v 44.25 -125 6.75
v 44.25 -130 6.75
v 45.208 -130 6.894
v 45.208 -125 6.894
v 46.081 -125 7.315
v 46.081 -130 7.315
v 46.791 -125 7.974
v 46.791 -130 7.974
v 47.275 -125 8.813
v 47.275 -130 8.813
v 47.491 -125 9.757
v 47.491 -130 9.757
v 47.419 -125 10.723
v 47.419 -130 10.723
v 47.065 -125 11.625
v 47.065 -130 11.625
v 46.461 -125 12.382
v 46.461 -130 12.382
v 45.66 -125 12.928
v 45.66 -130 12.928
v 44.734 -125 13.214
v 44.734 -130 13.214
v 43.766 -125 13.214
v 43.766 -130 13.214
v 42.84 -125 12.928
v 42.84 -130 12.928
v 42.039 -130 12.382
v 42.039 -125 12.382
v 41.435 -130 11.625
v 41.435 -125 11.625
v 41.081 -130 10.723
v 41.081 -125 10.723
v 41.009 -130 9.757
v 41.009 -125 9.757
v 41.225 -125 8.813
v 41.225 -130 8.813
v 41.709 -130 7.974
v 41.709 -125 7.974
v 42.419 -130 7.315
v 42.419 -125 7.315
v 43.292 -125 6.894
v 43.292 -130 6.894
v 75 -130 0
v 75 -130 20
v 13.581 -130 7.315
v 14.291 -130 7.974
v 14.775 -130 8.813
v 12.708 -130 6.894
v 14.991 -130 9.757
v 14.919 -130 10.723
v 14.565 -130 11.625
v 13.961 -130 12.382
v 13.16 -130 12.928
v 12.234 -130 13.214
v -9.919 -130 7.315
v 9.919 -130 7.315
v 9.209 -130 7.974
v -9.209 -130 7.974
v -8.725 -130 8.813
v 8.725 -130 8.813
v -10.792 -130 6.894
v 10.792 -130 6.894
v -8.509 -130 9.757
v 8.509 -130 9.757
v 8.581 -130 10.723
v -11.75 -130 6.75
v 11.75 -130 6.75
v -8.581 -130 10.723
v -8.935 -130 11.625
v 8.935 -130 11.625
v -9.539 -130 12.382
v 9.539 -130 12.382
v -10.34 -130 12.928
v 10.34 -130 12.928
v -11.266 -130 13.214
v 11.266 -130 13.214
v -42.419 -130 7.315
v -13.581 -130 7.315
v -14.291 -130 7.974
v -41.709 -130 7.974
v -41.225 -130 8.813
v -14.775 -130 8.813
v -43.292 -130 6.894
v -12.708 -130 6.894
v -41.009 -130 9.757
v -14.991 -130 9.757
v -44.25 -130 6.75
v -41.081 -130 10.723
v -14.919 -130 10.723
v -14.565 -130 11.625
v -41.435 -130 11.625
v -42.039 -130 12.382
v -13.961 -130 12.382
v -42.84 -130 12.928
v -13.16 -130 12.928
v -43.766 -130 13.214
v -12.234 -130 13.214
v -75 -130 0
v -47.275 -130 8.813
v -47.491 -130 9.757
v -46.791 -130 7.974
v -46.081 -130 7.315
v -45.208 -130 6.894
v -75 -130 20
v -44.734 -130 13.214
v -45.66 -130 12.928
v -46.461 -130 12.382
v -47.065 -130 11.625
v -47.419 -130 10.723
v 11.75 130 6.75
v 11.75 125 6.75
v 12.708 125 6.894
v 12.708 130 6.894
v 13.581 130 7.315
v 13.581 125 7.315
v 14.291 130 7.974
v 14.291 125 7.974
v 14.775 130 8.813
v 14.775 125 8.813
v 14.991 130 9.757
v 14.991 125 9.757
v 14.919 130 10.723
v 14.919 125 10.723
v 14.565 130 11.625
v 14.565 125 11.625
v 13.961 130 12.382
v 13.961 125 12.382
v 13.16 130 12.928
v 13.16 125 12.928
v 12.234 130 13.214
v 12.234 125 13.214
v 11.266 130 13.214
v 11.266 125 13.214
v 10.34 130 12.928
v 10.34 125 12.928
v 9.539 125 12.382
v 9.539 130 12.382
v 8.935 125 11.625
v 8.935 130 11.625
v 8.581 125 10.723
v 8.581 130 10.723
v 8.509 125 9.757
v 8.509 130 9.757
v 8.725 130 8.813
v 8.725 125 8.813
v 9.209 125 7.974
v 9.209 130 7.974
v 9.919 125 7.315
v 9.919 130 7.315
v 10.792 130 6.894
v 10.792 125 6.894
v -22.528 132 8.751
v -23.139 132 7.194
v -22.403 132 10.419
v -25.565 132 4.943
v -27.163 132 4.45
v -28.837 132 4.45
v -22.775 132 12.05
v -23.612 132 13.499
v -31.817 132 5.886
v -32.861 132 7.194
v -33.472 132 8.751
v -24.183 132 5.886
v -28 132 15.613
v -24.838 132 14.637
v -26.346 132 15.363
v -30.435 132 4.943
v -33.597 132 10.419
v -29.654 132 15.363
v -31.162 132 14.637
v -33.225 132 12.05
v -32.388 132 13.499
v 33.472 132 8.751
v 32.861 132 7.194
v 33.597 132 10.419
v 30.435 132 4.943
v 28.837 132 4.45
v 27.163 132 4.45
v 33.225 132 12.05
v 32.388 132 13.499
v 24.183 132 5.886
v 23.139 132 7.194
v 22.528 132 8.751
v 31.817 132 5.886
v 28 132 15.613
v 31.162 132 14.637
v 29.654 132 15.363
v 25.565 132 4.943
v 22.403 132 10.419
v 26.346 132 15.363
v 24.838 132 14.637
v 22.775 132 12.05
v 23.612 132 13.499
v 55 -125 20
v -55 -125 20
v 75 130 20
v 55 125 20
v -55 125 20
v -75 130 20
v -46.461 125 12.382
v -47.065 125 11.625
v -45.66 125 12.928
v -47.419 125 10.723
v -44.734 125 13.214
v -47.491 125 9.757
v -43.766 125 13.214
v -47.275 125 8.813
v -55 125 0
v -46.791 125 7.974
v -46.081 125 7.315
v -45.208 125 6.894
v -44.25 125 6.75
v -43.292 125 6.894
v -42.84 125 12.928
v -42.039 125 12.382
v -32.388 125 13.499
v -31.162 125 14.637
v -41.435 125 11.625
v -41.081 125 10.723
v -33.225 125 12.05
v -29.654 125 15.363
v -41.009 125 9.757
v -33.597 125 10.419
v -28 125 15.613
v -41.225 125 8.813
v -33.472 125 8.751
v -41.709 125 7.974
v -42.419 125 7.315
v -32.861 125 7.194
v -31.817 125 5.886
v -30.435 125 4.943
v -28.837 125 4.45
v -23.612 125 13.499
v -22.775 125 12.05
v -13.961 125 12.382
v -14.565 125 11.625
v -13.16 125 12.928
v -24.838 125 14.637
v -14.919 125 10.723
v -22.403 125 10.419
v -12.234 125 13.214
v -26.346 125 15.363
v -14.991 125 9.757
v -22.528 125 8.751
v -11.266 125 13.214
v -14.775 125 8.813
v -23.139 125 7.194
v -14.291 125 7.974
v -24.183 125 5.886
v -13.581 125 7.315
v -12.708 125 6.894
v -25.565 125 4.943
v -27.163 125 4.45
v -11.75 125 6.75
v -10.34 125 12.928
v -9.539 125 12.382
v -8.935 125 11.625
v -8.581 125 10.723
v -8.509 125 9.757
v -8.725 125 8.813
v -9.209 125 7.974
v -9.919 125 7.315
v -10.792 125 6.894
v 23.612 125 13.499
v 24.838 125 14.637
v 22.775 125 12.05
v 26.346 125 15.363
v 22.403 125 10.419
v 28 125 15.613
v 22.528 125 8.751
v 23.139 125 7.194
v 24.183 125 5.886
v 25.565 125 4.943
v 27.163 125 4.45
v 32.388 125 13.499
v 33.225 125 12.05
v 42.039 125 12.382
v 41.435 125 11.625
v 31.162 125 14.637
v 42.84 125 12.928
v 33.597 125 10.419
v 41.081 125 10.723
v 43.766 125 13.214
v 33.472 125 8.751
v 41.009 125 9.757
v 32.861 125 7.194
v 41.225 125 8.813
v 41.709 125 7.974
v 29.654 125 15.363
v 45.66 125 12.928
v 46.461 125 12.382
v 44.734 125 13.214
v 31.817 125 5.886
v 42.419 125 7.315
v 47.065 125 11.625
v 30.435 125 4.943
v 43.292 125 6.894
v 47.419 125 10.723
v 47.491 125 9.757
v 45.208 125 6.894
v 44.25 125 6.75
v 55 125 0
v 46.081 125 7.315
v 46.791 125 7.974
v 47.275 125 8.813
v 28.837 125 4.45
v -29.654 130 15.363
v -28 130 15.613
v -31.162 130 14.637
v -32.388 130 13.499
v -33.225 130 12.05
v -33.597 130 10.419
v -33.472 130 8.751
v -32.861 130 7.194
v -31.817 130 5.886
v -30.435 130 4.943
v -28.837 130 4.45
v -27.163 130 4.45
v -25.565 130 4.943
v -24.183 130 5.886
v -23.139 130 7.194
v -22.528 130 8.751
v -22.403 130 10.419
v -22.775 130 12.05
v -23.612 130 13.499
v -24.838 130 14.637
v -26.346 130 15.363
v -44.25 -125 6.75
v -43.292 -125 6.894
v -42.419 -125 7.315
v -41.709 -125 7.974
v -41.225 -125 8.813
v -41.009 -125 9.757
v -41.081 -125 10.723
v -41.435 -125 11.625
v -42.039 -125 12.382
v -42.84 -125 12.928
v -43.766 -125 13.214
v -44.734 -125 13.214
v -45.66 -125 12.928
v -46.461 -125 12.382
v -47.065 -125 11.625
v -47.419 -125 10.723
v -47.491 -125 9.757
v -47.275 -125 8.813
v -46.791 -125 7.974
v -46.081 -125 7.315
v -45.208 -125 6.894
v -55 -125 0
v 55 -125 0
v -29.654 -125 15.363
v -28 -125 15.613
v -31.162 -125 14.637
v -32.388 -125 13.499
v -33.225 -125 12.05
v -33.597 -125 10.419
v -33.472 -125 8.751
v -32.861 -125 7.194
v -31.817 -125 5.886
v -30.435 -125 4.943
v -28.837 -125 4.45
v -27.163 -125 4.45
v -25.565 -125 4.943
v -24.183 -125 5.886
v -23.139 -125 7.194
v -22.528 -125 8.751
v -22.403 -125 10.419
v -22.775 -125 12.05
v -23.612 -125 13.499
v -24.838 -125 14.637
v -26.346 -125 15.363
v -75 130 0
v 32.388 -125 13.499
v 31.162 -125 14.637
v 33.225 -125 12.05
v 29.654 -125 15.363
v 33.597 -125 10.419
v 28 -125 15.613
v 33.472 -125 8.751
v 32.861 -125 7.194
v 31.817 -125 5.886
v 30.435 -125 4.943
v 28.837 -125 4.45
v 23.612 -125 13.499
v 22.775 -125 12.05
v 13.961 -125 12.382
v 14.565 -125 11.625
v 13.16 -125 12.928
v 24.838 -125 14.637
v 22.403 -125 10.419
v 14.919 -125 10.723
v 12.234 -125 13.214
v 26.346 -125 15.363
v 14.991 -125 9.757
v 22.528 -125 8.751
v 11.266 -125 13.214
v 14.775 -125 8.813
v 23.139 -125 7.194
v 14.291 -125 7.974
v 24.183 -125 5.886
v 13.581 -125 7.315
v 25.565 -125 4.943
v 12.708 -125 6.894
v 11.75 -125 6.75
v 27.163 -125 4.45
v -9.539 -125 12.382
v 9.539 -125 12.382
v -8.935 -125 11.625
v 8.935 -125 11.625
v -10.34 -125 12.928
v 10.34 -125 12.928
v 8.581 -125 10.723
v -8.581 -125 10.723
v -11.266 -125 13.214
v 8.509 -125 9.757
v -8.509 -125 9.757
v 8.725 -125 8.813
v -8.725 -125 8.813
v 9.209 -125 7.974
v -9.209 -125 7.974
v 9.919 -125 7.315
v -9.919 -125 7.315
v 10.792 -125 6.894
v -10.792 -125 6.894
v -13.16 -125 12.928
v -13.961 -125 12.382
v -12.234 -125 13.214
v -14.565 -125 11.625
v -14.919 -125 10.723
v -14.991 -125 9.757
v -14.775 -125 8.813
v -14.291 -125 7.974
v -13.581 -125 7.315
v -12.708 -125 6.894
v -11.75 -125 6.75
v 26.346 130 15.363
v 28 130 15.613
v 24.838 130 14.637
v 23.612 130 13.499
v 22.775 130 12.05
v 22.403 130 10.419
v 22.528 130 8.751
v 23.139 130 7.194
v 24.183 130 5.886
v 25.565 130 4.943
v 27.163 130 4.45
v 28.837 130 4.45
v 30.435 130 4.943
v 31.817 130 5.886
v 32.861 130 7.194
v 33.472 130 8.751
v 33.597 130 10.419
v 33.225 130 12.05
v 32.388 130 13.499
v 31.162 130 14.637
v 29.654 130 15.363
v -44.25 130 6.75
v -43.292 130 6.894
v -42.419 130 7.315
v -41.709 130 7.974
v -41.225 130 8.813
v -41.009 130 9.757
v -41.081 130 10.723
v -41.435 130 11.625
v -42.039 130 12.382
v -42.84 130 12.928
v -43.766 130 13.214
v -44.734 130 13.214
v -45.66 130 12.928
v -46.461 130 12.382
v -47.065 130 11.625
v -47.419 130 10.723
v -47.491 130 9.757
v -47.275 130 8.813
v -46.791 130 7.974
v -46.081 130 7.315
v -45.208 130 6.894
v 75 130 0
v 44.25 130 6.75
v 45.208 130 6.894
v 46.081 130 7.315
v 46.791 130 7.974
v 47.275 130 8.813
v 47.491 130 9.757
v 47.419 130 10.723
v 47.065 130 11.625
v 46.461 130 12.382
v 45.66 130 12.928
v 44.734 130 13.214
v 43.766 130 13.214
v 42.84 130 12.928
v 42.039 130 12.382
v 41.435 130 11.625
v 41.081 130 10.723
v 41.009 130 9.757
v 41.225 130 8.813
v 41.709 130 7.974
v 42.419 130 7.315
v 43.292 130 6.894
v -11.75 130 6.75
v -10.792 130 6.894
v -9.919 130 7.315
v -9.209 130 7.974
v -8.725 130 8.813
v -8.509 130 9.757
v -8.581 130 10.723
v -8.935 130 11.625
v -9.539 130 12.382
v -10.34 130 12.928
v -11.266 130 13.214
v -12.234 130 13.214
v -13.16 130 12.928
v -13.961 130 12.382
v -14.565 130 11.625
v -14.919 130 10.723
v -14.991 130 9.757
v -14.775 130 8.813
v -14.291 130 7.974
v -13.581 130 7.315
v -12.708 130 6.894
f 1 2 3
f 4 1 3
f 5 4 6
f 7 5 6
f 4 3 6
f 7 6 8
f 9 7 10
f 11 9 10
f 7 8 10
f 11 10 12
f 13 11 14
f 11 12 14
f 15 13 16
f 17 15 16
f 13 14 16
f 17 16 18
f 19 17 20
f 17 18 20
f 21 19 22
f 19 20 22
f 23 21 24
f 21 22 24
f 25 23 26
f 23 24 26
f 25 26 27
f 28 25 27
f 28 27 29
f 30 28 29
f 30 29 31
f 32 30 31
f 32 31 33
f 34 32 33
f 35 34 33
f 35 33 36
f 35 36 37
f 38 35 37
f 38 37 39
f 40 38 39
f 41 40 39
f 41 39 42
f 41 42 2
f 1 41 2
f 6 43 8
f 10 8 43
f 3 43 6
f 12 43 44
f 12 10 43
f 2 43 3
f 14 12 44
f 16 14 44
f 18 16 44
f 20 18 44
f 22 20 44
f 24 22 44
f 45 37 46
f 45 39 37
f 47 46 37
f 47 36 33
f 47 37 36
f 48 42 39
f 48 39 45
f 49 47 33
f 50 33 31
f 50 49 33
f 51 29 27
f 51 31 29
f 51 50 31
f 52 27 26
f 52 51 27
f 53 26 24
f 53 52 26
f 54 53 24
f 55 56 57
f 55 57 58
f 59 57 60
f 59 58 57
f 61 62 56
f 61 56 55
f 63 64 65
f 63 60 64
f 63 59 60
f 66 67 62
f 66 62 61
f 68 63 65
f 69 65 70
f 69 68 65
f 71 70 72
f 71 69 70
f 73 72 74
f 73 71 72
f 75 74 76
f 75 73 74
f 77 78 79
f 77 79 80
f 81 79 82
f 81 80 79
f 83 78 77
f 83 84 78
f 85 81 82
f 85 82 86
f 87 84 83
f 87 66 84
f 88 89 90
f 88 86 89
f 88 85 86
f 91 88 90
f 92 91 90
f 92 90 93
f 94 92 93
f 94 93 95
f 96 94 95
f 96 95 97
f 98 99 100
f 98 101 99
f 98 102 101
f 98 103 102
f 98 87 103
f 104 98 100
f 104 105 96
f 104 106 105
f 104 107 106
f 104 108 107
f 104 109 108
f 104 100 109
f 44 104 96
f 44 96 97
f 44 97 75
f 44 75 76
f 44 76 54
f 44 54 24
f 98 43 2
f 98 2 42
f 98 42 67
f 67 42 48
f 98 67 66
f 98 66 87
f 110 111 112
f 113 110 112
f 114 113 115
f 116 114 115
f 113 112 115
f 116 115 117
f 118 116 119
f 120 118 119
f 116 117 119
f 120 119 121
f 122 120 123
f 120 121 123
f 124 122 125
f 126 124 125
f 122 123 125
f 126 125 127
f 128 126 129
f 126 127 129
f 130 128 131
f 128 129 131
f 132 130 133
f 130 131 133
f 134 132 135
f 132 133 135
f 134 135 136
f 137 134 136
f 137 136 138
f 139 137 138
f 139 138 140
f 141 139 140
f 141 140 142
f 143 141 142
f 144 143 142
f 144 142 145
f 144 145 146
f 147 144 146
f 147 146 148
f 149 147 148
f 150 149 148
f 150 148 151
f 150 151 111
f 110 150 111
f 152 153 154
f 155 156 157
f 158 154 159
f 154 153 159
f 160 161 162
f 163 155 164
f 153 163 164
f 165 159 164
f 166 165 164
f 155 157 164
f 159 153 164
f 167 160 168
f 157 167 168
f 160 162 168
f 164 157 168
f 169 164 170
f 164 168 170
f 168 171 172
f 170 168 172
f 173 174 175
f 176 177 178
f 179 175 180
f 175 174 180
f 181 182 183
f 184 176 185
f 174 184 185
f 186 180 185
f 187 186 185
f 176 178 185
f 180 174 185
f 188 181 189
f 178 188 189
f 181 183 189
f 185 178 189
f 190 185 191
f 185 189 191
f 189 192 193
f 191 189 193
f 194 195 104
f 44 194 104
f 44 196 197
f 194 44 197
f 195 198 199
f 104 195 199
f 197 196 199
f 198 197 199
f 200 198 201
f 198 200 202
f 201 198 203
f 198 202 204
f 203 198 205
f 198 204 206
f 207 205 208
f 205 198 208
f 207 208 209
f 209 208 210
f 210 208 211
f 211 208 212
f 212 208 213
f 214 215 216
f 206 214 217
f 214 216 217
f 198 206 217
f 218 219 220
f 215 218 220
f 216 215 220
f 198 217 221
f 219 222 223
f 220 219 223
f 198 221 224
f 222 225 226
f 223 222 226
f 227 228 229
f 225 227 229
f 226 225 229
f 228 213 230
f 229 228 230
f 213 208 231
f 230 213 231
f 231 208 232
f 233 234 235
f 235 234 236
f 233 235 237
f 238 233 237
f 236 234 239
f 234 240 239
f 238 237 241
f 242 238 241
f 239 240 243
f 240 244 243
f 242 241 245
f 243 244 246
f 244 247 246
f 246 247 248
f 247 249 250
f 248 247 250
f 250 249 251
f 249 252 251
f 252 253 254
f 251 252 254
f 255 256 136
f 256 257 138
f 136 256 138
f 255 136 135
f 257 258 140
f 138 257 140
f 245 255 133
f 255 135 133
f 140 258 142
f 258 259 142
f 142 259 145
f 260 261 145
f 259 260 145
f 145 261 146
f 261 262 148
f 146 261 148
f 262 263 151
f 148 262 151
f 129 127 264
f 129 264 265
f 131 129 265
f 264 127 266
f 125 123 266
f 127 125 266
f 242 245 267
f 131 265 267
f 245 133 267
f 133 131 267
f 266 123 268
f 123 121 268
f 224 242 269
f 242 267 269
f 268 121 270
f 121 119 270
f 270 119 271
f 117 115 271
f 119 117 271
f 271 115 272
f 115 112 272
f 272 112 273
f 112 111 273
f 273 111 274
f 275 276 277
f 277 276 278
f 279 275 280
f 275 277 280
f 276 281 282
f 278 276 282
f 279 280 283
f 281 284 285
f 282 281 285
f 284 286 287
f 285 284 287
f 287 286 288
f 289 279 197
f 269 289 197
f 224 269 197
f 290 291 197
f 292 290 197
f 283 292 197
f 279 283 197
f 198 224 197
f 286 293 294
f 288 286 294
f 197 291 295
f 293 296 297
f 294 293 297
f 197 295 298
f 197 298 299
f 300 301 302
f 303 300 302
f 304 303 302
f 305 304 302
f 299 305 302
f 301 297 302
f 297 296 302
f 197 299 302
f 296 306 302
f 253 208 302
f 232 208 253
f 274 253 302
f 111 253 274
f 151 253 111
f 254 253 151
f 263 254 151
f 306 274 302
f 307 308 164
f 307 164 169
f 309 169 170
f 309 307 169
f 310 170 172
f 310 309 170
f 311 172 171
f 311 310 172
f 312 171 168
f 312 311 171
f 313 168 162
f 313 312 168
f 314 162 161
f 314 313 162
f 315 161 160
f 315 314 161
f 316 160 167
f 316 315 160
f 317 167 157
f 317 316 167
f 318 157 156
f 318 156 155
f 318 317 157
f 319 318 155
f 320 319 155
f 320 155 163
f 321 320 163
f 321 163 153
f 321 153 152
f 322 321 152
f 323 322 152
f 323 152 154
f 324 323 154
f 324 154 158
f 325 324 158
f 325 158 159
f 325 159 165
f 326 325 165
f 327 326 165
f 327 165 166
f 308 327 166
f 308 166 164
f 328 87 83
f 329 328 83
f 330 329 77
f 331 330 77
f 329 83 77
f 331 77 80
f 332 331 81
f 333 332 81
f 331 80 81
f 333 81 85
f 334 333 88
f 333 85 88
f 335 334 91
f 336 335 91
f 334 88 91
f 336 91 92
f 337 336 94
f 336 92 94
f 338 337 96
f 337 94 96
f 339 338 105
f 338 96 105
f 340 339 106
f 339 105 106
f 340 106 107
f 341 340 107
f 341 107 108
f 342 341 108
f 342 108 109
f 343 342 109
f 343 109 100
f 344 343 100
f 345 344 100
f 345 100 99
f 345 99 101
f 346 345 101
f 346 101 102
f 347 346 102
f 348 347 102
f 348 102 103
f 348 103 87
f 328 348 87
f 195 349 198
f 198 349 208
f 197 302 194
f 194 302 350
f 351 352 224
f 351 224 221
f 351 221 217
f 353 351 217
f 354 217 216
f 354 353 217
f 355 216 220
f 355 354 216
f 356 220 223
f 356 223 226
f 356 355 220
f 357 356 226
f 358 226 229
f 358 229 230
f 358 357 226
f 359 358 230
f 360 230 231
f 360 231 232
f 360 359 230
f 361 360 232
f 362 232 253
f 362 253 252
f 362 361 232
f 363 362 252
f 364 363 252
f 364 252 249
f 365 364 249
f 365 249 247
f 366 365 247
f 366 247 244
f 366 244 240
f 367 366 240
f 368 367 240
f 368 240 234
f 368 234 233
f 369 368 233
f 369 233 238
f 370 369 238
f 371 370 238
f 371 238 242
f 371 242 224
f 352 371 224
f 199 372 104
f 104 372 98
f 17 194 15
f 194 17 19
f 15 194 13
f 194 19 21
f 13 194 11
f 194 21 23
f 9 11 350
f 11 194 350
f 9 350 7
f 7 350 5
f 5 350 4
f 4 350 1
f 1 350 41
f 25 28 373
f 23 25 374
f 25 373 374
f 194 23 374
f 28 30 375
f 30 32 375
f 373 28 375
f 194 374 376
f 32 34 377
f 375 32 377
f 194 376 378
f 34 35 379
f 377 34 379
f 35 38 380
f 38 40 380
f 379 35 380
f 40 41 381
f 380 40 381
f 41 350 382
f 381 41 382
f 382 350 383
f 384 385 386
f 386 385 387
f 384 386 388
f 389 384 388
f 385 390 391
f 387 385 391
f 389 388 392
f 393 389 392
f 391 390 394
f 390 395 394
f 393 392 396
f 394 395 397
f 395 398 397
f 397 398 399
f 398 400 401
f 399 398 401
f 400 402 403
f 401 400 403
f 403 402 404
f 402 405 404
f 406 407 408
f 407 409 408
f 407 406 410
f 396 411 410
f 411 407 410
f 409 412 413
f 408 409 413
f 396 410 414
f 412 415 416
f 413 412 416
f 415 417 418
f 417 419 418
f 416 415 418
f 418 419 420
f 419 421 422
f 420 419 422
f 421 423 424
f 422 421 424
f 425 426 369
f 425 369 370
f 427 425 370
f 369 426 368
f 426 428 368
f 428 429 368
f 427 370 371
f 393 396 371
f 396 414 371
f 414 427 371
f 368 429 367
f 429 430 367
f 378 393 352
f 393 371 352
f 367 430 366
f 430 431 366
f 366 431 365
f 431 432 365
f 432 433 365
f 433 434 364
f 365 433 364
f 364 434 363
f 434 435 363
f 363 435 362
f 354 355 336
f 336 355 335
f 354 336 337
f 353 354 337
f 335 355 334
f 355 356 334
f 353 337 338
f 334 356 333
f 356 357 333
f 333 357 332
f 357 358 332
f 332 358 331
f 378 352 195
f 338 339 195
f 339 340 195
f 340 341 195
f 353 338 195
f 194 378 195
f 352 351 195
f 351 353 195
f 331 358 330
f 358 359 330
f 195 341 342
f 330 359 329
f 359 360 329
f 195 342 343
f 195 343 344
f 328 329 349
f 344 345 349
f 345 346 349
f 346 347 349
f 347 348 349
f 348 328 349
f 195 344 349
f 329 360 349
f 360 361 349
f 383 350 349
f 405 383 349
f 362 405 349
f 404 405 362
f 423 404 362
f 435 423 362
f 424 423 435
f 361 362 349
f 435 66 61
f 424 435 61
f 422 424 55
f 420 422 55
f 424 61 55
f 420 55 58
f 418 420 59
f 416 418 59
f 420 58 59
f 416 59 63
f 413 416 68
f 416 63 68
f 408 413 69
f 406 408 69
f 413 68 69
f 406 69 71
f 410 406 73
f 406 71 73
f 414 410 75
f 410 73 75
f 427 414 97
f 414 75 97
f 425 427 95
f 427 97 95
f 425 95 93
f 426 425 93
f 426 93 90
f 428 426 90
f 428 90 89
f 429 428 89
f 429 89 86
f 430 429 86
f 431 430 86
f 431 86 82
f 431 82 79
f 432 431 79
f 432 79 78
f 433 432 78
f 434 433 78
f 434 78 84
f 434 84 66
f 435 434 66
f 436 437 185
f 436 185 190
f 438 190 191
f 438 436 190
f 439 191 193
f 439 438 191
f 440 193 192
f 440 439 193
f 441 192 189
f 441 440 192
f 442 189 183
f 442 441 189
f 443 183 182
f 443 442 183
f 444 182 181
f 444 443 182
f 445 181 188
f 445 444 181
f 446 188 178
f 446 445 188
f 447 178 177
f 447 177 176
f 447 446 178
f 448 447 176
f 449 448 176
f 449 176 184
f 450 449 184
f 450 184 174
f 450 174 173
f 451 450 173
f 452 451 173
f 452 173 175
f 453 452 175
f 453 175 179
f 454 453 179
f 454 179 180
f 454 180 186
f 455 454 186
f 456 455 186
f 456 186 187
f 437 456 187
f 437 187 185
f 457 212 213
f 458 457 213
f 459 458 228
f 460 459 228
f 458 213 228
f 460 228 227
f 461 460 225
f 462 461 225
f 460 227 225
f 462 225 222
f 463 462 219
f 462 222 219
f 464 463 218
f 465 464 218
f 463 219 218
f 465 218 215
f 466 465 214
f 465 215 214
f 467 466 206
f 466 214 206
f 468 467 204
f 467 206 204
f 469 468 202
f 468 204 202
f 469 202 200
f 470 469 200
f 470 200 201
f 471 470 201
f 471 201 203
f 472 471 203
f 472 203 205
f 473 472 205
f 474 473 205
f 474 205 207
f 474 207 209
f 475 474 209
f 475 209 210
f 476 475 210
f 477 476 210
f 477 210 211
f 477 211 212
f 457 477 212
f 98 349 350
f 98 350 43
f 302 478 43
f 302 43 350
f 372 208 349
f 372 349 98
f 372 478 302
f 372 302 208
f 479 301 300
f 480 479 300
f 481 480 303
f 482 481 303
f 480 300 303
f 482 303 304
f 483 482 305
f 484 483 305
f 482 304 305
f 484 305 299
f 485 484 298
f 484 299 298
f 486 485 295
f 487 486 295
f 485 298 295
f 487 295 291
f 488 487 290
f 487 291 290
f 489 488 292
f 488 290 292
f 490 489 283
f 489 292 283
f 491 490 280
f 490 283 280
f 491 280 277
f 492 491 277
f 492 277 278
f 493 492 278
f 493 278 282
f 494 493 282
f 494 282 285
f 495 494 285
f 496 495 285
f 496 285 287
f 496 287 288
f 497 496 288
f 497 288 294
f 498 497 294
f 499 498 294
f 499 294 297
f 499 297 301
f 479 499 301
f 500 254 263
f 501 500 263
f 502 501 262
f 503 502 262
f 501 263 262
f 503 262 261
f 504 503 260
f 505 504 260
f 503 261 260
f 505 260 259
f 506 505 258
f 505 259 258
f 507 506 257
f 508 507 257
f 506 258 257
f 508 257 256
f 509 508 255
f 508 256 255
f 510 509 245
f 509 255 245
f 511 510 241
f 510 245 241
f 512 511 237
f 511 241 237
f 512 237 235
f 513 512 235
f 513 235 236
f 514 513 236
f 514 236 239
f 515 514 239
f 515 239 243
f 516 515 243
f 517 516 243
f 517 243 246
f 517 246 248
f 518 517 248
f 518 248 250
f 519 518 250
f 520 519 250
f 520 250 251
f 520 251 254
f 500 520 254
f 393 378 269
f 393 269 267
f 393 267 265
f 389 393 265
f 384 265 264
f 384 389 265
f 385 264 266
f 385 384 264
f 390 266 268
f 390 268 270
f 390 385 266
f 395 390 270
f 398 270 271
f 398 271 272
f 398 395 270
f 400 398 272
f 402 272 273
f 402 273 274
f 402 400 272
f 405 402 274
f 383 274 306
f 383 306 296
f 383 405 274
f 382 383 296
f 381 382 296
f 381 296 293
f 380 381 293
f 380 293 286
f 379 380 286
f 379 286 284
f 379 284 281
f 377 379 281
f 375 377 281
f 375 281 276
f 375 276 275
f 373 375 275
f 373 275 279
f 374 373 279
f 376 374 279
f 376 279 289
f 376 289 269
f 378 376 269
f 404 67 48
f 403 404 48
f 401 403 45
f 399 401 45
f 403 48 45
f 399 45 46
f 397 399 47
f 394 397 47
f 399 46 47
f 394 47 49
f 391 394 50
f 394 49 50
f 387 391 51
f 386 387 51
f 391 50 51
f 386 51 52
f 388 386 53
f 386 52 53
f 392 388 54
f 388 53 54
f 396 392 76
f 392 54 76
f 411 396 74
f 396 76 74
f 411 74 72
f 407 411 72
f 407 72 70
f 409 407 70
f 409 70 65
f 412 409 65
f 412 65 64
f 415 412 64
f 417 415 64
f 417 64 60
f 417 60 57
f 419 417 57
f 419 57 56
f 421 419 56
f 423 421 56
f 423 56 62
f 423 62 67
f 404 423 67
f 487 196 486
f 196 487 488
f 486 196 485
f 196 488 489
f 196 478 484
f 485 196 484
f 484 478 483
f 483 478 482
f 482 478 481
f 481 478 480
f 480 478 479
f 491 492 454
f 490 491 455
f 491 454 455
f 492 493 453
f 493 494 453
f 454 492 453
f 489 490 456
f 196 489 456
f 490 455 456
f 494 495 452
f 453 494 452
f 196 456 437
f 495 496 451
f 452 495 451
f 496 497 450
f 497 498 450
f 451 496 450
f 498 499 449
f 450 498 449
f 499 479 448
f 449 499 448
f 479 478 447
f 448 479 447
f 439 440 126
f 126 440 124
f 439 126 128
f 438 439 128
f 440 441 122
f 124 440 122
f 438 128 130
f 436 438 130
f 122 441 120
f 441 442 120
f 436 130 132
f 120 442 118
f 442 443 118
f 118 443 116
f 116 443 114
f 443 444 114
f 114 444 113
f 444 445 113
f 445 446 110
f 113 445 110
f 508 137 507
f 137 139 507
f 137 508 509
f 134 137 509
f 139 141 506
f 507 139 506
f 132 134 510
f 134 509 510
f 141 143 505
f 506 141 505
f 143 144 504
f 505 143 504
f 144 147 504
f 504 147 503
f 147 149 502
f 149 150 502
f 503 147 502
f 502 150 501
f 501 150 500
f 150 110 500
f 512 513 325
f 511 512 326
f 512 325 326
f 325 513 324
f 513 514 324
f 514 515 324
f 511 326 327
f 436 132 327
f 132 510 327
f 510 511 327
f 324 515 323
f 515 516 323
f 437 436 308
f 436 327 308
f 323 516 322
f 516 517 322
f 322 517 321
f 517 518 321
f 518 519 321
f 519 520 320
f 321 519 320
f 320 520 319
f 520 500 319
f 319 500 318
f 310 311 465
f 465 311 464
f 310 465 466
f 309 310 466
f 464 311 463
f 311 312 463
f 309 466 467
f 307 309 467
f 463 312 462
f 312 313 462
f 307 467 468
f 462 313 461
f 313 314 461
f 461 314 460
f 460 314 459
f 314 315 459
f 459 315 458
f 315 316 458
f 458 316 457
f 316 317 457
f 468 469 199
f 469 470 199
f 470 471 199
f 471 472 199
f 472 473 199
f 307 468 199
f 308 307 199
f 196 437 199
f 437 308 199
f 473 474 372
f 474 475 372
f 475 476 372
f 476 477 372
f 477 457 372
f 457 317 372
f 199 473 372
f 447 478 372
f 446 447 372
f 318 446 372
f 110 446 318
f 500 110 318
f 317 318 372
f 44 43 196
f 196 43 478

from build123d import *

# Parameters (mm, degrees)
BOSS_EXTRUDE1_DEPTH = 20
SKETCH2_R           = 5.612511992
BOSS_EXTRUDE2_DEPTH = 262
SKETCH3_R           = 3.25
CUT_EXTRUDE1_DEPTH  = 10
SKETCH4_R           = 3.25
CUT_EXTRUDE2_DEPTH  = 10


with BuildPart() as part:
    # Sketch1 → Boss-Extrude1 (new body)
    with BuildSketch(Plane.XY):
        Polygon((-75, -125), (-75, 125), (-75, 130), (-63.356925632, 130), (75, 130), (75, 125), (75, -125), (75, -130), (-75, -130), align=None)
        Polygon((-55, -105), (-55, 105), (-55, 125), (55, 125), (55, 105), (55, -105), (55, -125), (-55, -125), align=None, mode=Mode.SUBTRACT)
    extrude(amount=BOSS_EXTRUDE1_DEPTH)

    # Sketch2 → Boss-Extrude2 (add)
    with BuildSketch(Plane.XZ.offset(130)):
        with Locations(Location((-28, 10, 0), (0, 0, 90))):
            Circle(SKETCH2_R)
        with Locations(Location((28, 10, 0), (0, 0, 90))):
            Circle(SKETCH2_R)
    extrude(amount=-BOSS_EXTRUDE2_DEPTH)

    # Sketch3 → Cut-Extrude1 (cut)
    with BuildSketch(Plane.XZ.offset(-125)):
        with Locations(Location((-44.25, 10, 0), (0, 0, 270))):
            Circle(SKETCH3_R)
        with Locations(Location((-11.75, 10, 0), (0, 0, 270))):
            Circle(SKETCH3_R)
        with Locations(Location((11.75, 10, 0), (0, 0, 270))):
            Circle(SKETCH3_R)
        with Locations(Location((44.25, 10, 0), (0, 0, 270))):
            Circle(SKETCH3_R)
    extrude(amount=-CUT_EXTRUDE1_DEPTH, mode=Mode.SUBTRACT)

    # Sketch4 → Cut-Extrude2 (cut)
    with BuildSketch(Plane.XZ.offset(130)):
        with Locations(Location((-44.25, 10, 0), (0, 0, 270))):
            Circle(SKETCH4_R)
        with Locations(Location((-11.75, 10, 0), (0, 0, 270))):
            Circle(SKETCH4_R)
        with Locations(Location((11.75, 10, 0), (0, 0, 270))):
            Circle(SKETCH4_R)
        with Locations(Location((44.25, 10, 0), (0, 0, 270))):
            Circle(SKETCH4_R)
    extrude(amount=-CUT_EXTRUDE2_DEPTH, mode=Mode.SUBTRACT)


solid = part.part
